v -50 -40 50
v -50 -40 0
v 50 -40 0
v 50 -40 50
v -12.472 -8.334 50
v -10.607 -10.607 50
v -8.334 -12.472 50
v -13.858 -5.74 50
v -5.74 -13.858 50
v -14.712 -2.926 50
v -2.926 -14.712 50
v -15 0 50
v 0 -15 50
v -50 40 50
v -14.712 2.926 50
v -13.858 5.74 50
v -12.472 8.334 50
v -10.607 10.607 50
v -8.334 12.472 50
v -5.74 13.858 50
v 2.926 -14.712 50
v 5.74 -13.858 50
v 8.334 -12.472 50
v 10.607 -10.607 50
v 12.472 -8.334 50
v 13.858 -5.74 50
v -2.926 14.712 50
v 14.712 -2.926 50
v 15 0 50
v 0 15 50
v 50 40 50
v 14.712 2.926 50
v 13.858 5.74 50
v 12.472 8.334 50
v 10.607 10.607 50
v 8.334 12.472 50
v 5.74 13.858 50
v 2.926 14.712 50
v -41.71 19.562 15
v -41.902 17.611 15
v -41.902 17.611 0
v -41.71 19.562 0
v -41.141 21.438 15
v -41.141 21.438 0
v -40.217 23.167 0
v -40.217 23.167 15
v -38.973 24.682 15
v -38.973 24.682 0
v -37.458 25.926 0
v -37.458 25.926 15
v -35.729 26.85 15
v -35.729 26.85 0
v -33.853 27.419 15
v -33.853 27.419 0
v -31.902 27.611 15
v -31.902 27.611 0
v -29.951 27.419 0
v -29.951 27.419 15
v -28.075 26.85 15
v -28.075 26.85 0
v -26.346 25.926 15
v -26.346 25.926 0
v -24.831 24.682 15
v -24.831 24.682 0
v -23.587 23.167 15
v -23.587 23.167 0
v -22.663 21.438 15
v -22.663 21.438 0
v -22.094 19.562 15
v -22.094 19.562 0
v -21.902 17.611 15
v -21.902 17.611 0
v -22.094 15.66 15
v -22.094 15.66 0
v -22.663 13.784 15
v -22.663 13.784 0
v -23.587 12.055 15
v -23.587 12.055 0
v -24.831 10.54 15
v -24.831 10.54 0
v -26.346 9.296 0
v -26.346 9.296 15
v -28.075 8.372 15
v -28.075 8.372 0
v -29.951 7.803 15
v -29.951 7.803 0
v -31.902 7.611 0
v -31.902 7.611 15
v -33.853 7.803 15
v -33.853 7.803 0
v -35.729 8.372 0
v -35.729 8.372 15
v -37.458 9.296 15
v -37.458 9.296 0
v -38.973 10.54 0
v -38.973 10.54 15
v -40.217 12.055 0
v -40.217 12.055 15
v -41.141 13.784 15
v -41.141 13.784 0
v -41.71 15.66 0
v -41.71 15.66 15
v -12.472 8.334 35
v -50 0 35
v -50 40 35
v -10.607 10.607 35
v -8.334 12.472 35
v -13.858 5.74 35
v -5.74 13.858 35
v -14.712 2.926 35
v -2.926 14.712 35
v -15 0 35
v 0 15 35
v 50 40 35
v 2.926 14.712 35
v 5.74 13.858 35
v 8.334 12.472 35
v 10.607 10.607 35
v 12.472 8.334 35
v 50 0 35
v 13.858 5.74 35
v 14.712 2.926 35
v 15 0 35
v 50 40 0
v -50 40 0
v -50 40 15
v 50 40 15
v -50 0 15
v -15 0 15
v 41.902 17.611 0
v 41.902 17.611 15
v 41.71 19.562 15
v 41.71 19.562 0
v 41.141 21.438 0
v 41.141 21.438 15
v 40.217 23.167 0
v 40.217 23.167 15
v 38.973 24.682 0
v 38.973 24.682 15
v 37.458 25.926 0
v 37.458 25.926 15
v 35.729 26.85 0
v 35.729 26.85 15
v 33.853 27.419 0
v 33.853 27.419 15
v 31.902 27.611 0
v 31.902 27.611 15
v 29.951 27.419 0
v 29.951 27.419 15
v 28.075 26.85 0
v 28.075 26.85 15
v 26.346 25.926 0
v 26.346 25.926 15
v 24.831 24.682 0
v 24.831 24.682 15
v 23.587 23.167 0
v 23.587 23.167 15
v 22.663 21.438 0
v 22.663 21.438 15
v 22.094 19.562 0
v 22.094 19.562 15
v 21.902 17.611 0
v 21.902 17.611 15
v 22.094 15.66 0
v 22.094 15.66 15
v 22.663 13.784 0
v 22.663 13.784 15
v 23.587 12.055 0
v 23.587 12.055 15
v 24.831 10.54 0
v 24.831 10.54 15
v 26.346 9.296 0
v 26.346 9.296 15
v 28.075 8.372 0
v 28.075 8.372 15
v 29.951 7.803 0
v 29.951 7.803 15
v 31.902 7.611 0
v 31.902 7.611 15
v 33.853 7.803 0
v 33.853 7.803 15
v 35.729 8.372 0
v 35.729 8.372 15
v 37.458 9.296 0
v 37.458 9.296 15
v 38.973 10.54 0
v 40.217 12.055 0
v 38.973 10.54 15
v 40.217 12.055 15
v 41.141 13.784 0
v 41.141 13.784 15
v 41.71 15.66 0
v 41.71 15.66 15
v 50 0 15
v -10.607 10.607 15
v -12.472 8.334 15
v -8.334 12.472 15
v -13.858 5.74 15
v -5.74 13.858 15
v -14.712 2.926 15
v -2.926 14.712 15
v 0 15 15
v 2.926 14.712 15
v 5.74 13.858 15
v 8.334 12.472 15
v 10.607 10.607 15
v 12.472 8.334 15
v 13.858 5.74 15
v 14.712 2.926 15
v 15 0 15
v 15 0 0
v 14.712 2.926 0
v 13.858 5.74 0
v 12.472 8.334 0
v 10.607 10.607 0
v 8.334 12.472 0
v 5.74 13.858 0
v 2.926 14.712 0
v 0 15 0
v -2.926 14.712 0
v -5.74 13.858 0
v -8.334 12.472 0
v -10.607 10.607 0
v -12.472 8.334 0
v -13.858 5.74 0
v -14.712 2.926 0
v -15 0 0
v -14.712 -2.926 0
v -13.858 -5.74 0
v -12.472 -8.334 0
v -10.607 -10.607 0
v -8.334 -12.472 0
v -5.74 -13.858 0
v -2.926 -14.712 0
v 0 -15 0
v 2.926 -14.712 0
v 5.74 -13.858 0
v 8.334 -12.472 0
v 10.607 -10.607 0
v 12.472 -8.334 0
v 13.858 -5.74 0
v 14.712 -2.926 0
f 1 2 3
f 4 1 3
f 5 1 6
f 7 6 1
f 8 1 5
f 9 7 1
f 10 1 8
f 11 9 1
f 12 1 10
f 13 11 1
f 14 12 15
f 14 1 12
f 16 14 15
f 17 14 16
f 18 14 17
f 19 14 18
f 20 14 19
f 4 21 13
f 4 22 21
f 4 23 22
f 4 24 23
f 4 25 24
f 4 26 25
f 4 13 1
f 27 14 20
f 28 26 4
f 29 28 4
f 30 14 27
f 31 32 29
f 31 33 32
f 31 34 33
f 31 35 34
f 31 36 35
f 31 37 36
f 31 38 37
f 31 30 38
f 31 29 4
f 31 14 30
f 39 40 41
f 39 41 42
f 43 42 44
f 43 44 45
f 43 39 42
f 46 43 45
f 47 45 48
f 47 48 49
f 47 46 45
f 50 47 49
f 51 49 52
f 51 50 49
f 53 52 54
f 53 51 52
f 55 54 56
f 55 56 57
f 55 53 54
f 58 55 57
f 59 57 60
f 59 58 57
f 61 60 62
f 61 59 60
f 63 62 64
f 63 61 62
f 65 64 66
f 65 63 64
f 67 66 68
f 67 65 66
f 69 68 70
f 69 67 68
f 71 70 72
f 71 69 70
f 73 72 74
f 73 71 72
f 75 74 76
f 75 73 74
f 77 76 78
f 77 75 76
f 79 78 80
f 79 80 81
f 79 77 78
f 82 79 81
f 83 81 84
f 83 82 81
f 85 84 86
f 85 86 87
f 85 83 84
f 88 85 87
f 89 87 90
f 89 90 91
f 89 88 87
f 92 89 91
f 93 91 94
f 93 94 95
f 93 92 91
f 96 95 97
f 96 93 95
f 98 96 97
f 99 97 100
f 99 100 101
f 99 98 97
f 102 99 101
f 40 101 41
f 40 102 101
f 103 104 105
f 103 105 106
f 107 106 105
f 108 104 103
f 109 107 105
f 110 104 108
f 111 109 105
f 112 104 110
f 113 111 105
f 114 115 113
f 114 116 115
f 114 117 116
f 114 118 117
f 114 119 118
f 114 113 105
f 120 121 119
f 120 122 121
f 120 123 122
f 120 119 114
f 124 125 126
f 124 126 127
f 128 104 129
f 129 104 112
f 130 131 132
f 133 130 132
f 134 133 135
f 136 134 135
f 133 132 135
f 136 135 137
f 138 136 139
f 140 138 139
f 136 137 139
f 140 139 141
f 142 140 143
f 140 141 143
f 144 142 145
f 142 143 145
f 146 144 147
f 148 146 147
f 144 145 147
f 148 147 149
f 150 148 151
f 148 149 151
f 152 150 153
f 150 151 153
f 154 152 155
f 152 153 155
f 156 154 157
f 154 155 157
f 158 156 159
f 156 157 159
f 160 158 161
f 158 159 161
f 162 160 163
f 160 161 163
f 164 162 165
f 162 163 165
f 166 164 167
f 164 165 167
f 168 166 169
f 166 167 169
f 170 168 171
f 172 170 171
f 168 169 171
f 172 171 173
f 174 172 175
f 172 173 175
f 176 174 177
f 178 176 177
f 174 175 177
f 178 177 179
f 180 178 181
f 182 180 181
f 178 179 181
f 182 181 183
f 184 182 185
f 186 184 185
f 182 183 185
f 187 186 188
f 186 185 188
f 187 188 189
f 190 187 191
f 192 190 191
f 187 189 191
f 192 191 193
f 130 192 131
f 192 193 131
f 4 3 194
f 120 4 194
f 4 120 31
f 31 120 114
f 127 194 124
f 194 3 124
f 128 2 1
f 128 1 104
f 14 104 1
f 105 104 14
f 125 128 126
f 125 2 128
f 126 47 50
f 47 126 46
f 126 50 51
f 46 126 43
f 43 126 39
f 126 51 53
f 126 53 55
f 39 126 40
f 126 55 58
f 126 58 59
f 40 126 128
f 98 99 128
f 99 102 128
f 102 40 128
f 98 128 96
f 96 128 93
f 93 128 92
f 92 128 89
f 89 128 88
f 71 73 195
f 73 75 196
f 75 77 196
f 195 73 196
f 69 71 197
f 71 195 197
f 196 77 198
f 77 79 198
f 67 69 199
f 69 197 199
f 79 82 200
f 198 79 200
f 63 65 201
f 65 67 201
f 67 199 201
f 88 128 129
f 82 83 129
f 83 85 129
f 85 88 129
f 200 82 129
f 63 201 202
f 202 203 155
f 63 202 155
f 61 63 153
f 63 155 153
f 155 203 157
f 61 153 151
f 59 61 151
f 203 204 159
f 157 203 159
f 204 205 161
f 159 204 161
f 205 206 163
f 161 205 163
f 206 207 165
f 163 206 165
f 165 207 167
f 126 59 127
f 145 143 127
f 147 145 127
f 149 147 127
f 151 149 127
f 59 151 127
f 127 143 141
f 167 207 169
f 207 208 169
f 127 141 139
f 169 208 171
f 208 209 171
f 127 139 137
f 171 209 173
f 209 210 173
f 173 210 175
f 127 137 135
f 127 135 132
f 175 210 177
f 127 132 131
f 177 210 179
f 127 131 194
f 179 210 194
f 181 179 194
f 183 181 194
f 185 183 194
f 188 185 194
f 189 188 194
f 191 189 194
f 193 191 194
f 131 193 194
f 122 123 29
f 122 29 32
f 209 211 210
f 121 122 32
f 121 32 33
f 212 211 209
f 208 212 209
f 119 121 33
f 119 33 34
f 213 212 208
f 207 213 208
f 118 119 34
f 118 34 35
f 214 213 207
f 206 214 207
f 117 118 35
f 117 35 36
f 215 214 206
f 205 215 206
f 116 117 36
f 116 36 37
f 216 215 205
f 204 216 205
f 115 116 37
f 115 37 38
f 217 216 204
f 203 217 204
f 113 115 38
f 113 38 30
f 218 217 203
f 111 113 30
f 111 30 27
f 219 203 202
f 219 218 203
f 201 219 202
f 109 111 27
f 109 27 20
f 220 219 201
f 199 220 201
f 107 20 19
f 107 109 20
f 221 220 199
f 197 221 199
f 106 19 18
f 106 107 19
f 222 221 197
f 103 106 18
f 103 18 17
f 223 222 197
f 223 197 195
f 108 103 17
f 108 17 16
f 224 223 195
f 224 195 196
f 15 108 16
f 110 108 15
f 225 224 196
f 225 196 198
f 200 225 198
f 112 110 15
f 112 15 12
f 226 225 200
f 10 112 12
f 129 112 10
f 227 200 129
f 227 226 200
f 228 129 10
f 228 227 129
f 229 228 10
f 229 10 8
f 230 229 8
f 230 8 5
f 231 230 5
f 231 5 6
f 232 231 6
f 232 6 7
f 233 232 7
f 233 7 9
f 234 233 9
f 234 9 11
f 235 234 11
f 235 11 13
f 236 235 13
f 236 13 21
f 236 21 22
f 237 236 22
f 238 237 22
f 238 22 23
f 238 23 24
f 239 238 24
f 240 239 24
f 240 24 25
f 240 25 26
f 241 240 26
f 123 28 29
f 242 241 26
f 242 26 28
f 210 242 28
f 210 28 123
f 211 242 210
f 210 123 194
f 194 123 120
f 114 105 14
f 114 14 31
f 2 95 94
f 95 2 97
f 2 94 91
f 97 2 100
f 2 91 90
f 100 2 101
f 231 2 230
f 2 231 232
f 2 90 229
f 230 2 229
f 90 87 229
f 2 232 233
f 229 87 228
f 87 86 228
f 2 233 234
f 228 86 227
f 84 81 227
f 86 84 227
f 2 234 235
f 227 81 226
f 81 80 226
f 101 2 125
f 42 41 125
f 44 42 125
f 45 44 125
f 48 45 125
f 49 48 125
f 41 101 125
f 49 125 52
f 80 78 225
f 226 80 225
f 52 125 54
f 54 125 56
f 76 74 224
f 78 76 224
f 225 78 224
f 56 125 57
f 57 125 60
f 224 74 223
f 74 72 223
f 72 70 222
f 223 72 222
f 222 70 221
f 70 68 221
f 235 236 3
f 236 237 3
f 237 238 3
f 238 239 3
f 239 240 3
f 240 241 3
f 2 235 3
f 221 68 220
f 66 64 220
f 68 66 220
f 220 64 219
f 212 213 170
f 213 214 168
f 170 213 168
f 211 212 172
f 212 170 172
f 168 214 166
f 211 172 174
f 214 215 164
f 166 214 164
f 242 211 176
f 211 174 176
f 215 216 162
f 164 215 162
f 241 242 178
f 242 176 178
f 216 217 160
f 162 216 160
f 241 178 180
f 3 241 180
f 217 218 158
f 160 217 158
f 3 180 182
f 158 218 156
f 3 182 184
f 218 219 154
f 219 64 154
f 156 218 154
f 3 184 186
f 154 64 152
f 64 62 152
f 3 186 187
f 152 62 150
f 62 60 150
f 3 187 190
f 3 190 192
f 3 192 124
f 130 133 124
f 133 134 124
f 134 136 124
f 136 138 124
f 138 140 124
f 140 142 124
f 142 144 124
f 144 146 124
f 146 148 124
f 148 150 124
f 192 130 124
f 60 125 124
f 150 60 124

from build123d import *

# Parameters (mm, degrees)
F0_W     = 100
F0_H     = 80
F0_R     = 15
F1_DEPTH = 50
F2_W     = 100
F2_H     = 20
F3_DEPTH = 50
F4_R     = 10
F5_DEPTH = 15


# Not quite as in the source:
# - a pattern or mirror of a feature is missing from the dataset's text; its kind, count and spacing are read off the source's solid


with BuildPart() as f1:
    # F0 (on Top) → F1 (new body)
    with BuildSketch(Plane.XY):
        Rectangle(F0_W, F0_H)
        Circle(F0_R, mode=Mode.SUBTRACT)
    extrude(amount=F1_DEPTH)

    # F2 (on Front) → F3 (cut)
    with BuildSketch(Plane.XZ):
        with Locations((0, 25)):
            Rectangle(F2_W, F2_H)
    extrude(amount=-F3_DEPTH, mode=Mode.SUBTRACT)

    # F4 (on face) → F5 (cut, through all)
    with BuildSketch(Plane.XY.offset(15)):
        with Locations((31.9020673633, 17.6108591259)):
            Circle(F4_R)
    f5 = extrude(amount=-F5_DEPTH, mode=Mode.SUBTRACT)

    # F5_copies: F5 across plane
    add(f5.mirror(Plane(origin=(0, 0, 0), x_dir=(0, 0, -1), z_dir=(-1, 0, 0))), mode=Mode.SUBTRACT)


solid = f1.part
